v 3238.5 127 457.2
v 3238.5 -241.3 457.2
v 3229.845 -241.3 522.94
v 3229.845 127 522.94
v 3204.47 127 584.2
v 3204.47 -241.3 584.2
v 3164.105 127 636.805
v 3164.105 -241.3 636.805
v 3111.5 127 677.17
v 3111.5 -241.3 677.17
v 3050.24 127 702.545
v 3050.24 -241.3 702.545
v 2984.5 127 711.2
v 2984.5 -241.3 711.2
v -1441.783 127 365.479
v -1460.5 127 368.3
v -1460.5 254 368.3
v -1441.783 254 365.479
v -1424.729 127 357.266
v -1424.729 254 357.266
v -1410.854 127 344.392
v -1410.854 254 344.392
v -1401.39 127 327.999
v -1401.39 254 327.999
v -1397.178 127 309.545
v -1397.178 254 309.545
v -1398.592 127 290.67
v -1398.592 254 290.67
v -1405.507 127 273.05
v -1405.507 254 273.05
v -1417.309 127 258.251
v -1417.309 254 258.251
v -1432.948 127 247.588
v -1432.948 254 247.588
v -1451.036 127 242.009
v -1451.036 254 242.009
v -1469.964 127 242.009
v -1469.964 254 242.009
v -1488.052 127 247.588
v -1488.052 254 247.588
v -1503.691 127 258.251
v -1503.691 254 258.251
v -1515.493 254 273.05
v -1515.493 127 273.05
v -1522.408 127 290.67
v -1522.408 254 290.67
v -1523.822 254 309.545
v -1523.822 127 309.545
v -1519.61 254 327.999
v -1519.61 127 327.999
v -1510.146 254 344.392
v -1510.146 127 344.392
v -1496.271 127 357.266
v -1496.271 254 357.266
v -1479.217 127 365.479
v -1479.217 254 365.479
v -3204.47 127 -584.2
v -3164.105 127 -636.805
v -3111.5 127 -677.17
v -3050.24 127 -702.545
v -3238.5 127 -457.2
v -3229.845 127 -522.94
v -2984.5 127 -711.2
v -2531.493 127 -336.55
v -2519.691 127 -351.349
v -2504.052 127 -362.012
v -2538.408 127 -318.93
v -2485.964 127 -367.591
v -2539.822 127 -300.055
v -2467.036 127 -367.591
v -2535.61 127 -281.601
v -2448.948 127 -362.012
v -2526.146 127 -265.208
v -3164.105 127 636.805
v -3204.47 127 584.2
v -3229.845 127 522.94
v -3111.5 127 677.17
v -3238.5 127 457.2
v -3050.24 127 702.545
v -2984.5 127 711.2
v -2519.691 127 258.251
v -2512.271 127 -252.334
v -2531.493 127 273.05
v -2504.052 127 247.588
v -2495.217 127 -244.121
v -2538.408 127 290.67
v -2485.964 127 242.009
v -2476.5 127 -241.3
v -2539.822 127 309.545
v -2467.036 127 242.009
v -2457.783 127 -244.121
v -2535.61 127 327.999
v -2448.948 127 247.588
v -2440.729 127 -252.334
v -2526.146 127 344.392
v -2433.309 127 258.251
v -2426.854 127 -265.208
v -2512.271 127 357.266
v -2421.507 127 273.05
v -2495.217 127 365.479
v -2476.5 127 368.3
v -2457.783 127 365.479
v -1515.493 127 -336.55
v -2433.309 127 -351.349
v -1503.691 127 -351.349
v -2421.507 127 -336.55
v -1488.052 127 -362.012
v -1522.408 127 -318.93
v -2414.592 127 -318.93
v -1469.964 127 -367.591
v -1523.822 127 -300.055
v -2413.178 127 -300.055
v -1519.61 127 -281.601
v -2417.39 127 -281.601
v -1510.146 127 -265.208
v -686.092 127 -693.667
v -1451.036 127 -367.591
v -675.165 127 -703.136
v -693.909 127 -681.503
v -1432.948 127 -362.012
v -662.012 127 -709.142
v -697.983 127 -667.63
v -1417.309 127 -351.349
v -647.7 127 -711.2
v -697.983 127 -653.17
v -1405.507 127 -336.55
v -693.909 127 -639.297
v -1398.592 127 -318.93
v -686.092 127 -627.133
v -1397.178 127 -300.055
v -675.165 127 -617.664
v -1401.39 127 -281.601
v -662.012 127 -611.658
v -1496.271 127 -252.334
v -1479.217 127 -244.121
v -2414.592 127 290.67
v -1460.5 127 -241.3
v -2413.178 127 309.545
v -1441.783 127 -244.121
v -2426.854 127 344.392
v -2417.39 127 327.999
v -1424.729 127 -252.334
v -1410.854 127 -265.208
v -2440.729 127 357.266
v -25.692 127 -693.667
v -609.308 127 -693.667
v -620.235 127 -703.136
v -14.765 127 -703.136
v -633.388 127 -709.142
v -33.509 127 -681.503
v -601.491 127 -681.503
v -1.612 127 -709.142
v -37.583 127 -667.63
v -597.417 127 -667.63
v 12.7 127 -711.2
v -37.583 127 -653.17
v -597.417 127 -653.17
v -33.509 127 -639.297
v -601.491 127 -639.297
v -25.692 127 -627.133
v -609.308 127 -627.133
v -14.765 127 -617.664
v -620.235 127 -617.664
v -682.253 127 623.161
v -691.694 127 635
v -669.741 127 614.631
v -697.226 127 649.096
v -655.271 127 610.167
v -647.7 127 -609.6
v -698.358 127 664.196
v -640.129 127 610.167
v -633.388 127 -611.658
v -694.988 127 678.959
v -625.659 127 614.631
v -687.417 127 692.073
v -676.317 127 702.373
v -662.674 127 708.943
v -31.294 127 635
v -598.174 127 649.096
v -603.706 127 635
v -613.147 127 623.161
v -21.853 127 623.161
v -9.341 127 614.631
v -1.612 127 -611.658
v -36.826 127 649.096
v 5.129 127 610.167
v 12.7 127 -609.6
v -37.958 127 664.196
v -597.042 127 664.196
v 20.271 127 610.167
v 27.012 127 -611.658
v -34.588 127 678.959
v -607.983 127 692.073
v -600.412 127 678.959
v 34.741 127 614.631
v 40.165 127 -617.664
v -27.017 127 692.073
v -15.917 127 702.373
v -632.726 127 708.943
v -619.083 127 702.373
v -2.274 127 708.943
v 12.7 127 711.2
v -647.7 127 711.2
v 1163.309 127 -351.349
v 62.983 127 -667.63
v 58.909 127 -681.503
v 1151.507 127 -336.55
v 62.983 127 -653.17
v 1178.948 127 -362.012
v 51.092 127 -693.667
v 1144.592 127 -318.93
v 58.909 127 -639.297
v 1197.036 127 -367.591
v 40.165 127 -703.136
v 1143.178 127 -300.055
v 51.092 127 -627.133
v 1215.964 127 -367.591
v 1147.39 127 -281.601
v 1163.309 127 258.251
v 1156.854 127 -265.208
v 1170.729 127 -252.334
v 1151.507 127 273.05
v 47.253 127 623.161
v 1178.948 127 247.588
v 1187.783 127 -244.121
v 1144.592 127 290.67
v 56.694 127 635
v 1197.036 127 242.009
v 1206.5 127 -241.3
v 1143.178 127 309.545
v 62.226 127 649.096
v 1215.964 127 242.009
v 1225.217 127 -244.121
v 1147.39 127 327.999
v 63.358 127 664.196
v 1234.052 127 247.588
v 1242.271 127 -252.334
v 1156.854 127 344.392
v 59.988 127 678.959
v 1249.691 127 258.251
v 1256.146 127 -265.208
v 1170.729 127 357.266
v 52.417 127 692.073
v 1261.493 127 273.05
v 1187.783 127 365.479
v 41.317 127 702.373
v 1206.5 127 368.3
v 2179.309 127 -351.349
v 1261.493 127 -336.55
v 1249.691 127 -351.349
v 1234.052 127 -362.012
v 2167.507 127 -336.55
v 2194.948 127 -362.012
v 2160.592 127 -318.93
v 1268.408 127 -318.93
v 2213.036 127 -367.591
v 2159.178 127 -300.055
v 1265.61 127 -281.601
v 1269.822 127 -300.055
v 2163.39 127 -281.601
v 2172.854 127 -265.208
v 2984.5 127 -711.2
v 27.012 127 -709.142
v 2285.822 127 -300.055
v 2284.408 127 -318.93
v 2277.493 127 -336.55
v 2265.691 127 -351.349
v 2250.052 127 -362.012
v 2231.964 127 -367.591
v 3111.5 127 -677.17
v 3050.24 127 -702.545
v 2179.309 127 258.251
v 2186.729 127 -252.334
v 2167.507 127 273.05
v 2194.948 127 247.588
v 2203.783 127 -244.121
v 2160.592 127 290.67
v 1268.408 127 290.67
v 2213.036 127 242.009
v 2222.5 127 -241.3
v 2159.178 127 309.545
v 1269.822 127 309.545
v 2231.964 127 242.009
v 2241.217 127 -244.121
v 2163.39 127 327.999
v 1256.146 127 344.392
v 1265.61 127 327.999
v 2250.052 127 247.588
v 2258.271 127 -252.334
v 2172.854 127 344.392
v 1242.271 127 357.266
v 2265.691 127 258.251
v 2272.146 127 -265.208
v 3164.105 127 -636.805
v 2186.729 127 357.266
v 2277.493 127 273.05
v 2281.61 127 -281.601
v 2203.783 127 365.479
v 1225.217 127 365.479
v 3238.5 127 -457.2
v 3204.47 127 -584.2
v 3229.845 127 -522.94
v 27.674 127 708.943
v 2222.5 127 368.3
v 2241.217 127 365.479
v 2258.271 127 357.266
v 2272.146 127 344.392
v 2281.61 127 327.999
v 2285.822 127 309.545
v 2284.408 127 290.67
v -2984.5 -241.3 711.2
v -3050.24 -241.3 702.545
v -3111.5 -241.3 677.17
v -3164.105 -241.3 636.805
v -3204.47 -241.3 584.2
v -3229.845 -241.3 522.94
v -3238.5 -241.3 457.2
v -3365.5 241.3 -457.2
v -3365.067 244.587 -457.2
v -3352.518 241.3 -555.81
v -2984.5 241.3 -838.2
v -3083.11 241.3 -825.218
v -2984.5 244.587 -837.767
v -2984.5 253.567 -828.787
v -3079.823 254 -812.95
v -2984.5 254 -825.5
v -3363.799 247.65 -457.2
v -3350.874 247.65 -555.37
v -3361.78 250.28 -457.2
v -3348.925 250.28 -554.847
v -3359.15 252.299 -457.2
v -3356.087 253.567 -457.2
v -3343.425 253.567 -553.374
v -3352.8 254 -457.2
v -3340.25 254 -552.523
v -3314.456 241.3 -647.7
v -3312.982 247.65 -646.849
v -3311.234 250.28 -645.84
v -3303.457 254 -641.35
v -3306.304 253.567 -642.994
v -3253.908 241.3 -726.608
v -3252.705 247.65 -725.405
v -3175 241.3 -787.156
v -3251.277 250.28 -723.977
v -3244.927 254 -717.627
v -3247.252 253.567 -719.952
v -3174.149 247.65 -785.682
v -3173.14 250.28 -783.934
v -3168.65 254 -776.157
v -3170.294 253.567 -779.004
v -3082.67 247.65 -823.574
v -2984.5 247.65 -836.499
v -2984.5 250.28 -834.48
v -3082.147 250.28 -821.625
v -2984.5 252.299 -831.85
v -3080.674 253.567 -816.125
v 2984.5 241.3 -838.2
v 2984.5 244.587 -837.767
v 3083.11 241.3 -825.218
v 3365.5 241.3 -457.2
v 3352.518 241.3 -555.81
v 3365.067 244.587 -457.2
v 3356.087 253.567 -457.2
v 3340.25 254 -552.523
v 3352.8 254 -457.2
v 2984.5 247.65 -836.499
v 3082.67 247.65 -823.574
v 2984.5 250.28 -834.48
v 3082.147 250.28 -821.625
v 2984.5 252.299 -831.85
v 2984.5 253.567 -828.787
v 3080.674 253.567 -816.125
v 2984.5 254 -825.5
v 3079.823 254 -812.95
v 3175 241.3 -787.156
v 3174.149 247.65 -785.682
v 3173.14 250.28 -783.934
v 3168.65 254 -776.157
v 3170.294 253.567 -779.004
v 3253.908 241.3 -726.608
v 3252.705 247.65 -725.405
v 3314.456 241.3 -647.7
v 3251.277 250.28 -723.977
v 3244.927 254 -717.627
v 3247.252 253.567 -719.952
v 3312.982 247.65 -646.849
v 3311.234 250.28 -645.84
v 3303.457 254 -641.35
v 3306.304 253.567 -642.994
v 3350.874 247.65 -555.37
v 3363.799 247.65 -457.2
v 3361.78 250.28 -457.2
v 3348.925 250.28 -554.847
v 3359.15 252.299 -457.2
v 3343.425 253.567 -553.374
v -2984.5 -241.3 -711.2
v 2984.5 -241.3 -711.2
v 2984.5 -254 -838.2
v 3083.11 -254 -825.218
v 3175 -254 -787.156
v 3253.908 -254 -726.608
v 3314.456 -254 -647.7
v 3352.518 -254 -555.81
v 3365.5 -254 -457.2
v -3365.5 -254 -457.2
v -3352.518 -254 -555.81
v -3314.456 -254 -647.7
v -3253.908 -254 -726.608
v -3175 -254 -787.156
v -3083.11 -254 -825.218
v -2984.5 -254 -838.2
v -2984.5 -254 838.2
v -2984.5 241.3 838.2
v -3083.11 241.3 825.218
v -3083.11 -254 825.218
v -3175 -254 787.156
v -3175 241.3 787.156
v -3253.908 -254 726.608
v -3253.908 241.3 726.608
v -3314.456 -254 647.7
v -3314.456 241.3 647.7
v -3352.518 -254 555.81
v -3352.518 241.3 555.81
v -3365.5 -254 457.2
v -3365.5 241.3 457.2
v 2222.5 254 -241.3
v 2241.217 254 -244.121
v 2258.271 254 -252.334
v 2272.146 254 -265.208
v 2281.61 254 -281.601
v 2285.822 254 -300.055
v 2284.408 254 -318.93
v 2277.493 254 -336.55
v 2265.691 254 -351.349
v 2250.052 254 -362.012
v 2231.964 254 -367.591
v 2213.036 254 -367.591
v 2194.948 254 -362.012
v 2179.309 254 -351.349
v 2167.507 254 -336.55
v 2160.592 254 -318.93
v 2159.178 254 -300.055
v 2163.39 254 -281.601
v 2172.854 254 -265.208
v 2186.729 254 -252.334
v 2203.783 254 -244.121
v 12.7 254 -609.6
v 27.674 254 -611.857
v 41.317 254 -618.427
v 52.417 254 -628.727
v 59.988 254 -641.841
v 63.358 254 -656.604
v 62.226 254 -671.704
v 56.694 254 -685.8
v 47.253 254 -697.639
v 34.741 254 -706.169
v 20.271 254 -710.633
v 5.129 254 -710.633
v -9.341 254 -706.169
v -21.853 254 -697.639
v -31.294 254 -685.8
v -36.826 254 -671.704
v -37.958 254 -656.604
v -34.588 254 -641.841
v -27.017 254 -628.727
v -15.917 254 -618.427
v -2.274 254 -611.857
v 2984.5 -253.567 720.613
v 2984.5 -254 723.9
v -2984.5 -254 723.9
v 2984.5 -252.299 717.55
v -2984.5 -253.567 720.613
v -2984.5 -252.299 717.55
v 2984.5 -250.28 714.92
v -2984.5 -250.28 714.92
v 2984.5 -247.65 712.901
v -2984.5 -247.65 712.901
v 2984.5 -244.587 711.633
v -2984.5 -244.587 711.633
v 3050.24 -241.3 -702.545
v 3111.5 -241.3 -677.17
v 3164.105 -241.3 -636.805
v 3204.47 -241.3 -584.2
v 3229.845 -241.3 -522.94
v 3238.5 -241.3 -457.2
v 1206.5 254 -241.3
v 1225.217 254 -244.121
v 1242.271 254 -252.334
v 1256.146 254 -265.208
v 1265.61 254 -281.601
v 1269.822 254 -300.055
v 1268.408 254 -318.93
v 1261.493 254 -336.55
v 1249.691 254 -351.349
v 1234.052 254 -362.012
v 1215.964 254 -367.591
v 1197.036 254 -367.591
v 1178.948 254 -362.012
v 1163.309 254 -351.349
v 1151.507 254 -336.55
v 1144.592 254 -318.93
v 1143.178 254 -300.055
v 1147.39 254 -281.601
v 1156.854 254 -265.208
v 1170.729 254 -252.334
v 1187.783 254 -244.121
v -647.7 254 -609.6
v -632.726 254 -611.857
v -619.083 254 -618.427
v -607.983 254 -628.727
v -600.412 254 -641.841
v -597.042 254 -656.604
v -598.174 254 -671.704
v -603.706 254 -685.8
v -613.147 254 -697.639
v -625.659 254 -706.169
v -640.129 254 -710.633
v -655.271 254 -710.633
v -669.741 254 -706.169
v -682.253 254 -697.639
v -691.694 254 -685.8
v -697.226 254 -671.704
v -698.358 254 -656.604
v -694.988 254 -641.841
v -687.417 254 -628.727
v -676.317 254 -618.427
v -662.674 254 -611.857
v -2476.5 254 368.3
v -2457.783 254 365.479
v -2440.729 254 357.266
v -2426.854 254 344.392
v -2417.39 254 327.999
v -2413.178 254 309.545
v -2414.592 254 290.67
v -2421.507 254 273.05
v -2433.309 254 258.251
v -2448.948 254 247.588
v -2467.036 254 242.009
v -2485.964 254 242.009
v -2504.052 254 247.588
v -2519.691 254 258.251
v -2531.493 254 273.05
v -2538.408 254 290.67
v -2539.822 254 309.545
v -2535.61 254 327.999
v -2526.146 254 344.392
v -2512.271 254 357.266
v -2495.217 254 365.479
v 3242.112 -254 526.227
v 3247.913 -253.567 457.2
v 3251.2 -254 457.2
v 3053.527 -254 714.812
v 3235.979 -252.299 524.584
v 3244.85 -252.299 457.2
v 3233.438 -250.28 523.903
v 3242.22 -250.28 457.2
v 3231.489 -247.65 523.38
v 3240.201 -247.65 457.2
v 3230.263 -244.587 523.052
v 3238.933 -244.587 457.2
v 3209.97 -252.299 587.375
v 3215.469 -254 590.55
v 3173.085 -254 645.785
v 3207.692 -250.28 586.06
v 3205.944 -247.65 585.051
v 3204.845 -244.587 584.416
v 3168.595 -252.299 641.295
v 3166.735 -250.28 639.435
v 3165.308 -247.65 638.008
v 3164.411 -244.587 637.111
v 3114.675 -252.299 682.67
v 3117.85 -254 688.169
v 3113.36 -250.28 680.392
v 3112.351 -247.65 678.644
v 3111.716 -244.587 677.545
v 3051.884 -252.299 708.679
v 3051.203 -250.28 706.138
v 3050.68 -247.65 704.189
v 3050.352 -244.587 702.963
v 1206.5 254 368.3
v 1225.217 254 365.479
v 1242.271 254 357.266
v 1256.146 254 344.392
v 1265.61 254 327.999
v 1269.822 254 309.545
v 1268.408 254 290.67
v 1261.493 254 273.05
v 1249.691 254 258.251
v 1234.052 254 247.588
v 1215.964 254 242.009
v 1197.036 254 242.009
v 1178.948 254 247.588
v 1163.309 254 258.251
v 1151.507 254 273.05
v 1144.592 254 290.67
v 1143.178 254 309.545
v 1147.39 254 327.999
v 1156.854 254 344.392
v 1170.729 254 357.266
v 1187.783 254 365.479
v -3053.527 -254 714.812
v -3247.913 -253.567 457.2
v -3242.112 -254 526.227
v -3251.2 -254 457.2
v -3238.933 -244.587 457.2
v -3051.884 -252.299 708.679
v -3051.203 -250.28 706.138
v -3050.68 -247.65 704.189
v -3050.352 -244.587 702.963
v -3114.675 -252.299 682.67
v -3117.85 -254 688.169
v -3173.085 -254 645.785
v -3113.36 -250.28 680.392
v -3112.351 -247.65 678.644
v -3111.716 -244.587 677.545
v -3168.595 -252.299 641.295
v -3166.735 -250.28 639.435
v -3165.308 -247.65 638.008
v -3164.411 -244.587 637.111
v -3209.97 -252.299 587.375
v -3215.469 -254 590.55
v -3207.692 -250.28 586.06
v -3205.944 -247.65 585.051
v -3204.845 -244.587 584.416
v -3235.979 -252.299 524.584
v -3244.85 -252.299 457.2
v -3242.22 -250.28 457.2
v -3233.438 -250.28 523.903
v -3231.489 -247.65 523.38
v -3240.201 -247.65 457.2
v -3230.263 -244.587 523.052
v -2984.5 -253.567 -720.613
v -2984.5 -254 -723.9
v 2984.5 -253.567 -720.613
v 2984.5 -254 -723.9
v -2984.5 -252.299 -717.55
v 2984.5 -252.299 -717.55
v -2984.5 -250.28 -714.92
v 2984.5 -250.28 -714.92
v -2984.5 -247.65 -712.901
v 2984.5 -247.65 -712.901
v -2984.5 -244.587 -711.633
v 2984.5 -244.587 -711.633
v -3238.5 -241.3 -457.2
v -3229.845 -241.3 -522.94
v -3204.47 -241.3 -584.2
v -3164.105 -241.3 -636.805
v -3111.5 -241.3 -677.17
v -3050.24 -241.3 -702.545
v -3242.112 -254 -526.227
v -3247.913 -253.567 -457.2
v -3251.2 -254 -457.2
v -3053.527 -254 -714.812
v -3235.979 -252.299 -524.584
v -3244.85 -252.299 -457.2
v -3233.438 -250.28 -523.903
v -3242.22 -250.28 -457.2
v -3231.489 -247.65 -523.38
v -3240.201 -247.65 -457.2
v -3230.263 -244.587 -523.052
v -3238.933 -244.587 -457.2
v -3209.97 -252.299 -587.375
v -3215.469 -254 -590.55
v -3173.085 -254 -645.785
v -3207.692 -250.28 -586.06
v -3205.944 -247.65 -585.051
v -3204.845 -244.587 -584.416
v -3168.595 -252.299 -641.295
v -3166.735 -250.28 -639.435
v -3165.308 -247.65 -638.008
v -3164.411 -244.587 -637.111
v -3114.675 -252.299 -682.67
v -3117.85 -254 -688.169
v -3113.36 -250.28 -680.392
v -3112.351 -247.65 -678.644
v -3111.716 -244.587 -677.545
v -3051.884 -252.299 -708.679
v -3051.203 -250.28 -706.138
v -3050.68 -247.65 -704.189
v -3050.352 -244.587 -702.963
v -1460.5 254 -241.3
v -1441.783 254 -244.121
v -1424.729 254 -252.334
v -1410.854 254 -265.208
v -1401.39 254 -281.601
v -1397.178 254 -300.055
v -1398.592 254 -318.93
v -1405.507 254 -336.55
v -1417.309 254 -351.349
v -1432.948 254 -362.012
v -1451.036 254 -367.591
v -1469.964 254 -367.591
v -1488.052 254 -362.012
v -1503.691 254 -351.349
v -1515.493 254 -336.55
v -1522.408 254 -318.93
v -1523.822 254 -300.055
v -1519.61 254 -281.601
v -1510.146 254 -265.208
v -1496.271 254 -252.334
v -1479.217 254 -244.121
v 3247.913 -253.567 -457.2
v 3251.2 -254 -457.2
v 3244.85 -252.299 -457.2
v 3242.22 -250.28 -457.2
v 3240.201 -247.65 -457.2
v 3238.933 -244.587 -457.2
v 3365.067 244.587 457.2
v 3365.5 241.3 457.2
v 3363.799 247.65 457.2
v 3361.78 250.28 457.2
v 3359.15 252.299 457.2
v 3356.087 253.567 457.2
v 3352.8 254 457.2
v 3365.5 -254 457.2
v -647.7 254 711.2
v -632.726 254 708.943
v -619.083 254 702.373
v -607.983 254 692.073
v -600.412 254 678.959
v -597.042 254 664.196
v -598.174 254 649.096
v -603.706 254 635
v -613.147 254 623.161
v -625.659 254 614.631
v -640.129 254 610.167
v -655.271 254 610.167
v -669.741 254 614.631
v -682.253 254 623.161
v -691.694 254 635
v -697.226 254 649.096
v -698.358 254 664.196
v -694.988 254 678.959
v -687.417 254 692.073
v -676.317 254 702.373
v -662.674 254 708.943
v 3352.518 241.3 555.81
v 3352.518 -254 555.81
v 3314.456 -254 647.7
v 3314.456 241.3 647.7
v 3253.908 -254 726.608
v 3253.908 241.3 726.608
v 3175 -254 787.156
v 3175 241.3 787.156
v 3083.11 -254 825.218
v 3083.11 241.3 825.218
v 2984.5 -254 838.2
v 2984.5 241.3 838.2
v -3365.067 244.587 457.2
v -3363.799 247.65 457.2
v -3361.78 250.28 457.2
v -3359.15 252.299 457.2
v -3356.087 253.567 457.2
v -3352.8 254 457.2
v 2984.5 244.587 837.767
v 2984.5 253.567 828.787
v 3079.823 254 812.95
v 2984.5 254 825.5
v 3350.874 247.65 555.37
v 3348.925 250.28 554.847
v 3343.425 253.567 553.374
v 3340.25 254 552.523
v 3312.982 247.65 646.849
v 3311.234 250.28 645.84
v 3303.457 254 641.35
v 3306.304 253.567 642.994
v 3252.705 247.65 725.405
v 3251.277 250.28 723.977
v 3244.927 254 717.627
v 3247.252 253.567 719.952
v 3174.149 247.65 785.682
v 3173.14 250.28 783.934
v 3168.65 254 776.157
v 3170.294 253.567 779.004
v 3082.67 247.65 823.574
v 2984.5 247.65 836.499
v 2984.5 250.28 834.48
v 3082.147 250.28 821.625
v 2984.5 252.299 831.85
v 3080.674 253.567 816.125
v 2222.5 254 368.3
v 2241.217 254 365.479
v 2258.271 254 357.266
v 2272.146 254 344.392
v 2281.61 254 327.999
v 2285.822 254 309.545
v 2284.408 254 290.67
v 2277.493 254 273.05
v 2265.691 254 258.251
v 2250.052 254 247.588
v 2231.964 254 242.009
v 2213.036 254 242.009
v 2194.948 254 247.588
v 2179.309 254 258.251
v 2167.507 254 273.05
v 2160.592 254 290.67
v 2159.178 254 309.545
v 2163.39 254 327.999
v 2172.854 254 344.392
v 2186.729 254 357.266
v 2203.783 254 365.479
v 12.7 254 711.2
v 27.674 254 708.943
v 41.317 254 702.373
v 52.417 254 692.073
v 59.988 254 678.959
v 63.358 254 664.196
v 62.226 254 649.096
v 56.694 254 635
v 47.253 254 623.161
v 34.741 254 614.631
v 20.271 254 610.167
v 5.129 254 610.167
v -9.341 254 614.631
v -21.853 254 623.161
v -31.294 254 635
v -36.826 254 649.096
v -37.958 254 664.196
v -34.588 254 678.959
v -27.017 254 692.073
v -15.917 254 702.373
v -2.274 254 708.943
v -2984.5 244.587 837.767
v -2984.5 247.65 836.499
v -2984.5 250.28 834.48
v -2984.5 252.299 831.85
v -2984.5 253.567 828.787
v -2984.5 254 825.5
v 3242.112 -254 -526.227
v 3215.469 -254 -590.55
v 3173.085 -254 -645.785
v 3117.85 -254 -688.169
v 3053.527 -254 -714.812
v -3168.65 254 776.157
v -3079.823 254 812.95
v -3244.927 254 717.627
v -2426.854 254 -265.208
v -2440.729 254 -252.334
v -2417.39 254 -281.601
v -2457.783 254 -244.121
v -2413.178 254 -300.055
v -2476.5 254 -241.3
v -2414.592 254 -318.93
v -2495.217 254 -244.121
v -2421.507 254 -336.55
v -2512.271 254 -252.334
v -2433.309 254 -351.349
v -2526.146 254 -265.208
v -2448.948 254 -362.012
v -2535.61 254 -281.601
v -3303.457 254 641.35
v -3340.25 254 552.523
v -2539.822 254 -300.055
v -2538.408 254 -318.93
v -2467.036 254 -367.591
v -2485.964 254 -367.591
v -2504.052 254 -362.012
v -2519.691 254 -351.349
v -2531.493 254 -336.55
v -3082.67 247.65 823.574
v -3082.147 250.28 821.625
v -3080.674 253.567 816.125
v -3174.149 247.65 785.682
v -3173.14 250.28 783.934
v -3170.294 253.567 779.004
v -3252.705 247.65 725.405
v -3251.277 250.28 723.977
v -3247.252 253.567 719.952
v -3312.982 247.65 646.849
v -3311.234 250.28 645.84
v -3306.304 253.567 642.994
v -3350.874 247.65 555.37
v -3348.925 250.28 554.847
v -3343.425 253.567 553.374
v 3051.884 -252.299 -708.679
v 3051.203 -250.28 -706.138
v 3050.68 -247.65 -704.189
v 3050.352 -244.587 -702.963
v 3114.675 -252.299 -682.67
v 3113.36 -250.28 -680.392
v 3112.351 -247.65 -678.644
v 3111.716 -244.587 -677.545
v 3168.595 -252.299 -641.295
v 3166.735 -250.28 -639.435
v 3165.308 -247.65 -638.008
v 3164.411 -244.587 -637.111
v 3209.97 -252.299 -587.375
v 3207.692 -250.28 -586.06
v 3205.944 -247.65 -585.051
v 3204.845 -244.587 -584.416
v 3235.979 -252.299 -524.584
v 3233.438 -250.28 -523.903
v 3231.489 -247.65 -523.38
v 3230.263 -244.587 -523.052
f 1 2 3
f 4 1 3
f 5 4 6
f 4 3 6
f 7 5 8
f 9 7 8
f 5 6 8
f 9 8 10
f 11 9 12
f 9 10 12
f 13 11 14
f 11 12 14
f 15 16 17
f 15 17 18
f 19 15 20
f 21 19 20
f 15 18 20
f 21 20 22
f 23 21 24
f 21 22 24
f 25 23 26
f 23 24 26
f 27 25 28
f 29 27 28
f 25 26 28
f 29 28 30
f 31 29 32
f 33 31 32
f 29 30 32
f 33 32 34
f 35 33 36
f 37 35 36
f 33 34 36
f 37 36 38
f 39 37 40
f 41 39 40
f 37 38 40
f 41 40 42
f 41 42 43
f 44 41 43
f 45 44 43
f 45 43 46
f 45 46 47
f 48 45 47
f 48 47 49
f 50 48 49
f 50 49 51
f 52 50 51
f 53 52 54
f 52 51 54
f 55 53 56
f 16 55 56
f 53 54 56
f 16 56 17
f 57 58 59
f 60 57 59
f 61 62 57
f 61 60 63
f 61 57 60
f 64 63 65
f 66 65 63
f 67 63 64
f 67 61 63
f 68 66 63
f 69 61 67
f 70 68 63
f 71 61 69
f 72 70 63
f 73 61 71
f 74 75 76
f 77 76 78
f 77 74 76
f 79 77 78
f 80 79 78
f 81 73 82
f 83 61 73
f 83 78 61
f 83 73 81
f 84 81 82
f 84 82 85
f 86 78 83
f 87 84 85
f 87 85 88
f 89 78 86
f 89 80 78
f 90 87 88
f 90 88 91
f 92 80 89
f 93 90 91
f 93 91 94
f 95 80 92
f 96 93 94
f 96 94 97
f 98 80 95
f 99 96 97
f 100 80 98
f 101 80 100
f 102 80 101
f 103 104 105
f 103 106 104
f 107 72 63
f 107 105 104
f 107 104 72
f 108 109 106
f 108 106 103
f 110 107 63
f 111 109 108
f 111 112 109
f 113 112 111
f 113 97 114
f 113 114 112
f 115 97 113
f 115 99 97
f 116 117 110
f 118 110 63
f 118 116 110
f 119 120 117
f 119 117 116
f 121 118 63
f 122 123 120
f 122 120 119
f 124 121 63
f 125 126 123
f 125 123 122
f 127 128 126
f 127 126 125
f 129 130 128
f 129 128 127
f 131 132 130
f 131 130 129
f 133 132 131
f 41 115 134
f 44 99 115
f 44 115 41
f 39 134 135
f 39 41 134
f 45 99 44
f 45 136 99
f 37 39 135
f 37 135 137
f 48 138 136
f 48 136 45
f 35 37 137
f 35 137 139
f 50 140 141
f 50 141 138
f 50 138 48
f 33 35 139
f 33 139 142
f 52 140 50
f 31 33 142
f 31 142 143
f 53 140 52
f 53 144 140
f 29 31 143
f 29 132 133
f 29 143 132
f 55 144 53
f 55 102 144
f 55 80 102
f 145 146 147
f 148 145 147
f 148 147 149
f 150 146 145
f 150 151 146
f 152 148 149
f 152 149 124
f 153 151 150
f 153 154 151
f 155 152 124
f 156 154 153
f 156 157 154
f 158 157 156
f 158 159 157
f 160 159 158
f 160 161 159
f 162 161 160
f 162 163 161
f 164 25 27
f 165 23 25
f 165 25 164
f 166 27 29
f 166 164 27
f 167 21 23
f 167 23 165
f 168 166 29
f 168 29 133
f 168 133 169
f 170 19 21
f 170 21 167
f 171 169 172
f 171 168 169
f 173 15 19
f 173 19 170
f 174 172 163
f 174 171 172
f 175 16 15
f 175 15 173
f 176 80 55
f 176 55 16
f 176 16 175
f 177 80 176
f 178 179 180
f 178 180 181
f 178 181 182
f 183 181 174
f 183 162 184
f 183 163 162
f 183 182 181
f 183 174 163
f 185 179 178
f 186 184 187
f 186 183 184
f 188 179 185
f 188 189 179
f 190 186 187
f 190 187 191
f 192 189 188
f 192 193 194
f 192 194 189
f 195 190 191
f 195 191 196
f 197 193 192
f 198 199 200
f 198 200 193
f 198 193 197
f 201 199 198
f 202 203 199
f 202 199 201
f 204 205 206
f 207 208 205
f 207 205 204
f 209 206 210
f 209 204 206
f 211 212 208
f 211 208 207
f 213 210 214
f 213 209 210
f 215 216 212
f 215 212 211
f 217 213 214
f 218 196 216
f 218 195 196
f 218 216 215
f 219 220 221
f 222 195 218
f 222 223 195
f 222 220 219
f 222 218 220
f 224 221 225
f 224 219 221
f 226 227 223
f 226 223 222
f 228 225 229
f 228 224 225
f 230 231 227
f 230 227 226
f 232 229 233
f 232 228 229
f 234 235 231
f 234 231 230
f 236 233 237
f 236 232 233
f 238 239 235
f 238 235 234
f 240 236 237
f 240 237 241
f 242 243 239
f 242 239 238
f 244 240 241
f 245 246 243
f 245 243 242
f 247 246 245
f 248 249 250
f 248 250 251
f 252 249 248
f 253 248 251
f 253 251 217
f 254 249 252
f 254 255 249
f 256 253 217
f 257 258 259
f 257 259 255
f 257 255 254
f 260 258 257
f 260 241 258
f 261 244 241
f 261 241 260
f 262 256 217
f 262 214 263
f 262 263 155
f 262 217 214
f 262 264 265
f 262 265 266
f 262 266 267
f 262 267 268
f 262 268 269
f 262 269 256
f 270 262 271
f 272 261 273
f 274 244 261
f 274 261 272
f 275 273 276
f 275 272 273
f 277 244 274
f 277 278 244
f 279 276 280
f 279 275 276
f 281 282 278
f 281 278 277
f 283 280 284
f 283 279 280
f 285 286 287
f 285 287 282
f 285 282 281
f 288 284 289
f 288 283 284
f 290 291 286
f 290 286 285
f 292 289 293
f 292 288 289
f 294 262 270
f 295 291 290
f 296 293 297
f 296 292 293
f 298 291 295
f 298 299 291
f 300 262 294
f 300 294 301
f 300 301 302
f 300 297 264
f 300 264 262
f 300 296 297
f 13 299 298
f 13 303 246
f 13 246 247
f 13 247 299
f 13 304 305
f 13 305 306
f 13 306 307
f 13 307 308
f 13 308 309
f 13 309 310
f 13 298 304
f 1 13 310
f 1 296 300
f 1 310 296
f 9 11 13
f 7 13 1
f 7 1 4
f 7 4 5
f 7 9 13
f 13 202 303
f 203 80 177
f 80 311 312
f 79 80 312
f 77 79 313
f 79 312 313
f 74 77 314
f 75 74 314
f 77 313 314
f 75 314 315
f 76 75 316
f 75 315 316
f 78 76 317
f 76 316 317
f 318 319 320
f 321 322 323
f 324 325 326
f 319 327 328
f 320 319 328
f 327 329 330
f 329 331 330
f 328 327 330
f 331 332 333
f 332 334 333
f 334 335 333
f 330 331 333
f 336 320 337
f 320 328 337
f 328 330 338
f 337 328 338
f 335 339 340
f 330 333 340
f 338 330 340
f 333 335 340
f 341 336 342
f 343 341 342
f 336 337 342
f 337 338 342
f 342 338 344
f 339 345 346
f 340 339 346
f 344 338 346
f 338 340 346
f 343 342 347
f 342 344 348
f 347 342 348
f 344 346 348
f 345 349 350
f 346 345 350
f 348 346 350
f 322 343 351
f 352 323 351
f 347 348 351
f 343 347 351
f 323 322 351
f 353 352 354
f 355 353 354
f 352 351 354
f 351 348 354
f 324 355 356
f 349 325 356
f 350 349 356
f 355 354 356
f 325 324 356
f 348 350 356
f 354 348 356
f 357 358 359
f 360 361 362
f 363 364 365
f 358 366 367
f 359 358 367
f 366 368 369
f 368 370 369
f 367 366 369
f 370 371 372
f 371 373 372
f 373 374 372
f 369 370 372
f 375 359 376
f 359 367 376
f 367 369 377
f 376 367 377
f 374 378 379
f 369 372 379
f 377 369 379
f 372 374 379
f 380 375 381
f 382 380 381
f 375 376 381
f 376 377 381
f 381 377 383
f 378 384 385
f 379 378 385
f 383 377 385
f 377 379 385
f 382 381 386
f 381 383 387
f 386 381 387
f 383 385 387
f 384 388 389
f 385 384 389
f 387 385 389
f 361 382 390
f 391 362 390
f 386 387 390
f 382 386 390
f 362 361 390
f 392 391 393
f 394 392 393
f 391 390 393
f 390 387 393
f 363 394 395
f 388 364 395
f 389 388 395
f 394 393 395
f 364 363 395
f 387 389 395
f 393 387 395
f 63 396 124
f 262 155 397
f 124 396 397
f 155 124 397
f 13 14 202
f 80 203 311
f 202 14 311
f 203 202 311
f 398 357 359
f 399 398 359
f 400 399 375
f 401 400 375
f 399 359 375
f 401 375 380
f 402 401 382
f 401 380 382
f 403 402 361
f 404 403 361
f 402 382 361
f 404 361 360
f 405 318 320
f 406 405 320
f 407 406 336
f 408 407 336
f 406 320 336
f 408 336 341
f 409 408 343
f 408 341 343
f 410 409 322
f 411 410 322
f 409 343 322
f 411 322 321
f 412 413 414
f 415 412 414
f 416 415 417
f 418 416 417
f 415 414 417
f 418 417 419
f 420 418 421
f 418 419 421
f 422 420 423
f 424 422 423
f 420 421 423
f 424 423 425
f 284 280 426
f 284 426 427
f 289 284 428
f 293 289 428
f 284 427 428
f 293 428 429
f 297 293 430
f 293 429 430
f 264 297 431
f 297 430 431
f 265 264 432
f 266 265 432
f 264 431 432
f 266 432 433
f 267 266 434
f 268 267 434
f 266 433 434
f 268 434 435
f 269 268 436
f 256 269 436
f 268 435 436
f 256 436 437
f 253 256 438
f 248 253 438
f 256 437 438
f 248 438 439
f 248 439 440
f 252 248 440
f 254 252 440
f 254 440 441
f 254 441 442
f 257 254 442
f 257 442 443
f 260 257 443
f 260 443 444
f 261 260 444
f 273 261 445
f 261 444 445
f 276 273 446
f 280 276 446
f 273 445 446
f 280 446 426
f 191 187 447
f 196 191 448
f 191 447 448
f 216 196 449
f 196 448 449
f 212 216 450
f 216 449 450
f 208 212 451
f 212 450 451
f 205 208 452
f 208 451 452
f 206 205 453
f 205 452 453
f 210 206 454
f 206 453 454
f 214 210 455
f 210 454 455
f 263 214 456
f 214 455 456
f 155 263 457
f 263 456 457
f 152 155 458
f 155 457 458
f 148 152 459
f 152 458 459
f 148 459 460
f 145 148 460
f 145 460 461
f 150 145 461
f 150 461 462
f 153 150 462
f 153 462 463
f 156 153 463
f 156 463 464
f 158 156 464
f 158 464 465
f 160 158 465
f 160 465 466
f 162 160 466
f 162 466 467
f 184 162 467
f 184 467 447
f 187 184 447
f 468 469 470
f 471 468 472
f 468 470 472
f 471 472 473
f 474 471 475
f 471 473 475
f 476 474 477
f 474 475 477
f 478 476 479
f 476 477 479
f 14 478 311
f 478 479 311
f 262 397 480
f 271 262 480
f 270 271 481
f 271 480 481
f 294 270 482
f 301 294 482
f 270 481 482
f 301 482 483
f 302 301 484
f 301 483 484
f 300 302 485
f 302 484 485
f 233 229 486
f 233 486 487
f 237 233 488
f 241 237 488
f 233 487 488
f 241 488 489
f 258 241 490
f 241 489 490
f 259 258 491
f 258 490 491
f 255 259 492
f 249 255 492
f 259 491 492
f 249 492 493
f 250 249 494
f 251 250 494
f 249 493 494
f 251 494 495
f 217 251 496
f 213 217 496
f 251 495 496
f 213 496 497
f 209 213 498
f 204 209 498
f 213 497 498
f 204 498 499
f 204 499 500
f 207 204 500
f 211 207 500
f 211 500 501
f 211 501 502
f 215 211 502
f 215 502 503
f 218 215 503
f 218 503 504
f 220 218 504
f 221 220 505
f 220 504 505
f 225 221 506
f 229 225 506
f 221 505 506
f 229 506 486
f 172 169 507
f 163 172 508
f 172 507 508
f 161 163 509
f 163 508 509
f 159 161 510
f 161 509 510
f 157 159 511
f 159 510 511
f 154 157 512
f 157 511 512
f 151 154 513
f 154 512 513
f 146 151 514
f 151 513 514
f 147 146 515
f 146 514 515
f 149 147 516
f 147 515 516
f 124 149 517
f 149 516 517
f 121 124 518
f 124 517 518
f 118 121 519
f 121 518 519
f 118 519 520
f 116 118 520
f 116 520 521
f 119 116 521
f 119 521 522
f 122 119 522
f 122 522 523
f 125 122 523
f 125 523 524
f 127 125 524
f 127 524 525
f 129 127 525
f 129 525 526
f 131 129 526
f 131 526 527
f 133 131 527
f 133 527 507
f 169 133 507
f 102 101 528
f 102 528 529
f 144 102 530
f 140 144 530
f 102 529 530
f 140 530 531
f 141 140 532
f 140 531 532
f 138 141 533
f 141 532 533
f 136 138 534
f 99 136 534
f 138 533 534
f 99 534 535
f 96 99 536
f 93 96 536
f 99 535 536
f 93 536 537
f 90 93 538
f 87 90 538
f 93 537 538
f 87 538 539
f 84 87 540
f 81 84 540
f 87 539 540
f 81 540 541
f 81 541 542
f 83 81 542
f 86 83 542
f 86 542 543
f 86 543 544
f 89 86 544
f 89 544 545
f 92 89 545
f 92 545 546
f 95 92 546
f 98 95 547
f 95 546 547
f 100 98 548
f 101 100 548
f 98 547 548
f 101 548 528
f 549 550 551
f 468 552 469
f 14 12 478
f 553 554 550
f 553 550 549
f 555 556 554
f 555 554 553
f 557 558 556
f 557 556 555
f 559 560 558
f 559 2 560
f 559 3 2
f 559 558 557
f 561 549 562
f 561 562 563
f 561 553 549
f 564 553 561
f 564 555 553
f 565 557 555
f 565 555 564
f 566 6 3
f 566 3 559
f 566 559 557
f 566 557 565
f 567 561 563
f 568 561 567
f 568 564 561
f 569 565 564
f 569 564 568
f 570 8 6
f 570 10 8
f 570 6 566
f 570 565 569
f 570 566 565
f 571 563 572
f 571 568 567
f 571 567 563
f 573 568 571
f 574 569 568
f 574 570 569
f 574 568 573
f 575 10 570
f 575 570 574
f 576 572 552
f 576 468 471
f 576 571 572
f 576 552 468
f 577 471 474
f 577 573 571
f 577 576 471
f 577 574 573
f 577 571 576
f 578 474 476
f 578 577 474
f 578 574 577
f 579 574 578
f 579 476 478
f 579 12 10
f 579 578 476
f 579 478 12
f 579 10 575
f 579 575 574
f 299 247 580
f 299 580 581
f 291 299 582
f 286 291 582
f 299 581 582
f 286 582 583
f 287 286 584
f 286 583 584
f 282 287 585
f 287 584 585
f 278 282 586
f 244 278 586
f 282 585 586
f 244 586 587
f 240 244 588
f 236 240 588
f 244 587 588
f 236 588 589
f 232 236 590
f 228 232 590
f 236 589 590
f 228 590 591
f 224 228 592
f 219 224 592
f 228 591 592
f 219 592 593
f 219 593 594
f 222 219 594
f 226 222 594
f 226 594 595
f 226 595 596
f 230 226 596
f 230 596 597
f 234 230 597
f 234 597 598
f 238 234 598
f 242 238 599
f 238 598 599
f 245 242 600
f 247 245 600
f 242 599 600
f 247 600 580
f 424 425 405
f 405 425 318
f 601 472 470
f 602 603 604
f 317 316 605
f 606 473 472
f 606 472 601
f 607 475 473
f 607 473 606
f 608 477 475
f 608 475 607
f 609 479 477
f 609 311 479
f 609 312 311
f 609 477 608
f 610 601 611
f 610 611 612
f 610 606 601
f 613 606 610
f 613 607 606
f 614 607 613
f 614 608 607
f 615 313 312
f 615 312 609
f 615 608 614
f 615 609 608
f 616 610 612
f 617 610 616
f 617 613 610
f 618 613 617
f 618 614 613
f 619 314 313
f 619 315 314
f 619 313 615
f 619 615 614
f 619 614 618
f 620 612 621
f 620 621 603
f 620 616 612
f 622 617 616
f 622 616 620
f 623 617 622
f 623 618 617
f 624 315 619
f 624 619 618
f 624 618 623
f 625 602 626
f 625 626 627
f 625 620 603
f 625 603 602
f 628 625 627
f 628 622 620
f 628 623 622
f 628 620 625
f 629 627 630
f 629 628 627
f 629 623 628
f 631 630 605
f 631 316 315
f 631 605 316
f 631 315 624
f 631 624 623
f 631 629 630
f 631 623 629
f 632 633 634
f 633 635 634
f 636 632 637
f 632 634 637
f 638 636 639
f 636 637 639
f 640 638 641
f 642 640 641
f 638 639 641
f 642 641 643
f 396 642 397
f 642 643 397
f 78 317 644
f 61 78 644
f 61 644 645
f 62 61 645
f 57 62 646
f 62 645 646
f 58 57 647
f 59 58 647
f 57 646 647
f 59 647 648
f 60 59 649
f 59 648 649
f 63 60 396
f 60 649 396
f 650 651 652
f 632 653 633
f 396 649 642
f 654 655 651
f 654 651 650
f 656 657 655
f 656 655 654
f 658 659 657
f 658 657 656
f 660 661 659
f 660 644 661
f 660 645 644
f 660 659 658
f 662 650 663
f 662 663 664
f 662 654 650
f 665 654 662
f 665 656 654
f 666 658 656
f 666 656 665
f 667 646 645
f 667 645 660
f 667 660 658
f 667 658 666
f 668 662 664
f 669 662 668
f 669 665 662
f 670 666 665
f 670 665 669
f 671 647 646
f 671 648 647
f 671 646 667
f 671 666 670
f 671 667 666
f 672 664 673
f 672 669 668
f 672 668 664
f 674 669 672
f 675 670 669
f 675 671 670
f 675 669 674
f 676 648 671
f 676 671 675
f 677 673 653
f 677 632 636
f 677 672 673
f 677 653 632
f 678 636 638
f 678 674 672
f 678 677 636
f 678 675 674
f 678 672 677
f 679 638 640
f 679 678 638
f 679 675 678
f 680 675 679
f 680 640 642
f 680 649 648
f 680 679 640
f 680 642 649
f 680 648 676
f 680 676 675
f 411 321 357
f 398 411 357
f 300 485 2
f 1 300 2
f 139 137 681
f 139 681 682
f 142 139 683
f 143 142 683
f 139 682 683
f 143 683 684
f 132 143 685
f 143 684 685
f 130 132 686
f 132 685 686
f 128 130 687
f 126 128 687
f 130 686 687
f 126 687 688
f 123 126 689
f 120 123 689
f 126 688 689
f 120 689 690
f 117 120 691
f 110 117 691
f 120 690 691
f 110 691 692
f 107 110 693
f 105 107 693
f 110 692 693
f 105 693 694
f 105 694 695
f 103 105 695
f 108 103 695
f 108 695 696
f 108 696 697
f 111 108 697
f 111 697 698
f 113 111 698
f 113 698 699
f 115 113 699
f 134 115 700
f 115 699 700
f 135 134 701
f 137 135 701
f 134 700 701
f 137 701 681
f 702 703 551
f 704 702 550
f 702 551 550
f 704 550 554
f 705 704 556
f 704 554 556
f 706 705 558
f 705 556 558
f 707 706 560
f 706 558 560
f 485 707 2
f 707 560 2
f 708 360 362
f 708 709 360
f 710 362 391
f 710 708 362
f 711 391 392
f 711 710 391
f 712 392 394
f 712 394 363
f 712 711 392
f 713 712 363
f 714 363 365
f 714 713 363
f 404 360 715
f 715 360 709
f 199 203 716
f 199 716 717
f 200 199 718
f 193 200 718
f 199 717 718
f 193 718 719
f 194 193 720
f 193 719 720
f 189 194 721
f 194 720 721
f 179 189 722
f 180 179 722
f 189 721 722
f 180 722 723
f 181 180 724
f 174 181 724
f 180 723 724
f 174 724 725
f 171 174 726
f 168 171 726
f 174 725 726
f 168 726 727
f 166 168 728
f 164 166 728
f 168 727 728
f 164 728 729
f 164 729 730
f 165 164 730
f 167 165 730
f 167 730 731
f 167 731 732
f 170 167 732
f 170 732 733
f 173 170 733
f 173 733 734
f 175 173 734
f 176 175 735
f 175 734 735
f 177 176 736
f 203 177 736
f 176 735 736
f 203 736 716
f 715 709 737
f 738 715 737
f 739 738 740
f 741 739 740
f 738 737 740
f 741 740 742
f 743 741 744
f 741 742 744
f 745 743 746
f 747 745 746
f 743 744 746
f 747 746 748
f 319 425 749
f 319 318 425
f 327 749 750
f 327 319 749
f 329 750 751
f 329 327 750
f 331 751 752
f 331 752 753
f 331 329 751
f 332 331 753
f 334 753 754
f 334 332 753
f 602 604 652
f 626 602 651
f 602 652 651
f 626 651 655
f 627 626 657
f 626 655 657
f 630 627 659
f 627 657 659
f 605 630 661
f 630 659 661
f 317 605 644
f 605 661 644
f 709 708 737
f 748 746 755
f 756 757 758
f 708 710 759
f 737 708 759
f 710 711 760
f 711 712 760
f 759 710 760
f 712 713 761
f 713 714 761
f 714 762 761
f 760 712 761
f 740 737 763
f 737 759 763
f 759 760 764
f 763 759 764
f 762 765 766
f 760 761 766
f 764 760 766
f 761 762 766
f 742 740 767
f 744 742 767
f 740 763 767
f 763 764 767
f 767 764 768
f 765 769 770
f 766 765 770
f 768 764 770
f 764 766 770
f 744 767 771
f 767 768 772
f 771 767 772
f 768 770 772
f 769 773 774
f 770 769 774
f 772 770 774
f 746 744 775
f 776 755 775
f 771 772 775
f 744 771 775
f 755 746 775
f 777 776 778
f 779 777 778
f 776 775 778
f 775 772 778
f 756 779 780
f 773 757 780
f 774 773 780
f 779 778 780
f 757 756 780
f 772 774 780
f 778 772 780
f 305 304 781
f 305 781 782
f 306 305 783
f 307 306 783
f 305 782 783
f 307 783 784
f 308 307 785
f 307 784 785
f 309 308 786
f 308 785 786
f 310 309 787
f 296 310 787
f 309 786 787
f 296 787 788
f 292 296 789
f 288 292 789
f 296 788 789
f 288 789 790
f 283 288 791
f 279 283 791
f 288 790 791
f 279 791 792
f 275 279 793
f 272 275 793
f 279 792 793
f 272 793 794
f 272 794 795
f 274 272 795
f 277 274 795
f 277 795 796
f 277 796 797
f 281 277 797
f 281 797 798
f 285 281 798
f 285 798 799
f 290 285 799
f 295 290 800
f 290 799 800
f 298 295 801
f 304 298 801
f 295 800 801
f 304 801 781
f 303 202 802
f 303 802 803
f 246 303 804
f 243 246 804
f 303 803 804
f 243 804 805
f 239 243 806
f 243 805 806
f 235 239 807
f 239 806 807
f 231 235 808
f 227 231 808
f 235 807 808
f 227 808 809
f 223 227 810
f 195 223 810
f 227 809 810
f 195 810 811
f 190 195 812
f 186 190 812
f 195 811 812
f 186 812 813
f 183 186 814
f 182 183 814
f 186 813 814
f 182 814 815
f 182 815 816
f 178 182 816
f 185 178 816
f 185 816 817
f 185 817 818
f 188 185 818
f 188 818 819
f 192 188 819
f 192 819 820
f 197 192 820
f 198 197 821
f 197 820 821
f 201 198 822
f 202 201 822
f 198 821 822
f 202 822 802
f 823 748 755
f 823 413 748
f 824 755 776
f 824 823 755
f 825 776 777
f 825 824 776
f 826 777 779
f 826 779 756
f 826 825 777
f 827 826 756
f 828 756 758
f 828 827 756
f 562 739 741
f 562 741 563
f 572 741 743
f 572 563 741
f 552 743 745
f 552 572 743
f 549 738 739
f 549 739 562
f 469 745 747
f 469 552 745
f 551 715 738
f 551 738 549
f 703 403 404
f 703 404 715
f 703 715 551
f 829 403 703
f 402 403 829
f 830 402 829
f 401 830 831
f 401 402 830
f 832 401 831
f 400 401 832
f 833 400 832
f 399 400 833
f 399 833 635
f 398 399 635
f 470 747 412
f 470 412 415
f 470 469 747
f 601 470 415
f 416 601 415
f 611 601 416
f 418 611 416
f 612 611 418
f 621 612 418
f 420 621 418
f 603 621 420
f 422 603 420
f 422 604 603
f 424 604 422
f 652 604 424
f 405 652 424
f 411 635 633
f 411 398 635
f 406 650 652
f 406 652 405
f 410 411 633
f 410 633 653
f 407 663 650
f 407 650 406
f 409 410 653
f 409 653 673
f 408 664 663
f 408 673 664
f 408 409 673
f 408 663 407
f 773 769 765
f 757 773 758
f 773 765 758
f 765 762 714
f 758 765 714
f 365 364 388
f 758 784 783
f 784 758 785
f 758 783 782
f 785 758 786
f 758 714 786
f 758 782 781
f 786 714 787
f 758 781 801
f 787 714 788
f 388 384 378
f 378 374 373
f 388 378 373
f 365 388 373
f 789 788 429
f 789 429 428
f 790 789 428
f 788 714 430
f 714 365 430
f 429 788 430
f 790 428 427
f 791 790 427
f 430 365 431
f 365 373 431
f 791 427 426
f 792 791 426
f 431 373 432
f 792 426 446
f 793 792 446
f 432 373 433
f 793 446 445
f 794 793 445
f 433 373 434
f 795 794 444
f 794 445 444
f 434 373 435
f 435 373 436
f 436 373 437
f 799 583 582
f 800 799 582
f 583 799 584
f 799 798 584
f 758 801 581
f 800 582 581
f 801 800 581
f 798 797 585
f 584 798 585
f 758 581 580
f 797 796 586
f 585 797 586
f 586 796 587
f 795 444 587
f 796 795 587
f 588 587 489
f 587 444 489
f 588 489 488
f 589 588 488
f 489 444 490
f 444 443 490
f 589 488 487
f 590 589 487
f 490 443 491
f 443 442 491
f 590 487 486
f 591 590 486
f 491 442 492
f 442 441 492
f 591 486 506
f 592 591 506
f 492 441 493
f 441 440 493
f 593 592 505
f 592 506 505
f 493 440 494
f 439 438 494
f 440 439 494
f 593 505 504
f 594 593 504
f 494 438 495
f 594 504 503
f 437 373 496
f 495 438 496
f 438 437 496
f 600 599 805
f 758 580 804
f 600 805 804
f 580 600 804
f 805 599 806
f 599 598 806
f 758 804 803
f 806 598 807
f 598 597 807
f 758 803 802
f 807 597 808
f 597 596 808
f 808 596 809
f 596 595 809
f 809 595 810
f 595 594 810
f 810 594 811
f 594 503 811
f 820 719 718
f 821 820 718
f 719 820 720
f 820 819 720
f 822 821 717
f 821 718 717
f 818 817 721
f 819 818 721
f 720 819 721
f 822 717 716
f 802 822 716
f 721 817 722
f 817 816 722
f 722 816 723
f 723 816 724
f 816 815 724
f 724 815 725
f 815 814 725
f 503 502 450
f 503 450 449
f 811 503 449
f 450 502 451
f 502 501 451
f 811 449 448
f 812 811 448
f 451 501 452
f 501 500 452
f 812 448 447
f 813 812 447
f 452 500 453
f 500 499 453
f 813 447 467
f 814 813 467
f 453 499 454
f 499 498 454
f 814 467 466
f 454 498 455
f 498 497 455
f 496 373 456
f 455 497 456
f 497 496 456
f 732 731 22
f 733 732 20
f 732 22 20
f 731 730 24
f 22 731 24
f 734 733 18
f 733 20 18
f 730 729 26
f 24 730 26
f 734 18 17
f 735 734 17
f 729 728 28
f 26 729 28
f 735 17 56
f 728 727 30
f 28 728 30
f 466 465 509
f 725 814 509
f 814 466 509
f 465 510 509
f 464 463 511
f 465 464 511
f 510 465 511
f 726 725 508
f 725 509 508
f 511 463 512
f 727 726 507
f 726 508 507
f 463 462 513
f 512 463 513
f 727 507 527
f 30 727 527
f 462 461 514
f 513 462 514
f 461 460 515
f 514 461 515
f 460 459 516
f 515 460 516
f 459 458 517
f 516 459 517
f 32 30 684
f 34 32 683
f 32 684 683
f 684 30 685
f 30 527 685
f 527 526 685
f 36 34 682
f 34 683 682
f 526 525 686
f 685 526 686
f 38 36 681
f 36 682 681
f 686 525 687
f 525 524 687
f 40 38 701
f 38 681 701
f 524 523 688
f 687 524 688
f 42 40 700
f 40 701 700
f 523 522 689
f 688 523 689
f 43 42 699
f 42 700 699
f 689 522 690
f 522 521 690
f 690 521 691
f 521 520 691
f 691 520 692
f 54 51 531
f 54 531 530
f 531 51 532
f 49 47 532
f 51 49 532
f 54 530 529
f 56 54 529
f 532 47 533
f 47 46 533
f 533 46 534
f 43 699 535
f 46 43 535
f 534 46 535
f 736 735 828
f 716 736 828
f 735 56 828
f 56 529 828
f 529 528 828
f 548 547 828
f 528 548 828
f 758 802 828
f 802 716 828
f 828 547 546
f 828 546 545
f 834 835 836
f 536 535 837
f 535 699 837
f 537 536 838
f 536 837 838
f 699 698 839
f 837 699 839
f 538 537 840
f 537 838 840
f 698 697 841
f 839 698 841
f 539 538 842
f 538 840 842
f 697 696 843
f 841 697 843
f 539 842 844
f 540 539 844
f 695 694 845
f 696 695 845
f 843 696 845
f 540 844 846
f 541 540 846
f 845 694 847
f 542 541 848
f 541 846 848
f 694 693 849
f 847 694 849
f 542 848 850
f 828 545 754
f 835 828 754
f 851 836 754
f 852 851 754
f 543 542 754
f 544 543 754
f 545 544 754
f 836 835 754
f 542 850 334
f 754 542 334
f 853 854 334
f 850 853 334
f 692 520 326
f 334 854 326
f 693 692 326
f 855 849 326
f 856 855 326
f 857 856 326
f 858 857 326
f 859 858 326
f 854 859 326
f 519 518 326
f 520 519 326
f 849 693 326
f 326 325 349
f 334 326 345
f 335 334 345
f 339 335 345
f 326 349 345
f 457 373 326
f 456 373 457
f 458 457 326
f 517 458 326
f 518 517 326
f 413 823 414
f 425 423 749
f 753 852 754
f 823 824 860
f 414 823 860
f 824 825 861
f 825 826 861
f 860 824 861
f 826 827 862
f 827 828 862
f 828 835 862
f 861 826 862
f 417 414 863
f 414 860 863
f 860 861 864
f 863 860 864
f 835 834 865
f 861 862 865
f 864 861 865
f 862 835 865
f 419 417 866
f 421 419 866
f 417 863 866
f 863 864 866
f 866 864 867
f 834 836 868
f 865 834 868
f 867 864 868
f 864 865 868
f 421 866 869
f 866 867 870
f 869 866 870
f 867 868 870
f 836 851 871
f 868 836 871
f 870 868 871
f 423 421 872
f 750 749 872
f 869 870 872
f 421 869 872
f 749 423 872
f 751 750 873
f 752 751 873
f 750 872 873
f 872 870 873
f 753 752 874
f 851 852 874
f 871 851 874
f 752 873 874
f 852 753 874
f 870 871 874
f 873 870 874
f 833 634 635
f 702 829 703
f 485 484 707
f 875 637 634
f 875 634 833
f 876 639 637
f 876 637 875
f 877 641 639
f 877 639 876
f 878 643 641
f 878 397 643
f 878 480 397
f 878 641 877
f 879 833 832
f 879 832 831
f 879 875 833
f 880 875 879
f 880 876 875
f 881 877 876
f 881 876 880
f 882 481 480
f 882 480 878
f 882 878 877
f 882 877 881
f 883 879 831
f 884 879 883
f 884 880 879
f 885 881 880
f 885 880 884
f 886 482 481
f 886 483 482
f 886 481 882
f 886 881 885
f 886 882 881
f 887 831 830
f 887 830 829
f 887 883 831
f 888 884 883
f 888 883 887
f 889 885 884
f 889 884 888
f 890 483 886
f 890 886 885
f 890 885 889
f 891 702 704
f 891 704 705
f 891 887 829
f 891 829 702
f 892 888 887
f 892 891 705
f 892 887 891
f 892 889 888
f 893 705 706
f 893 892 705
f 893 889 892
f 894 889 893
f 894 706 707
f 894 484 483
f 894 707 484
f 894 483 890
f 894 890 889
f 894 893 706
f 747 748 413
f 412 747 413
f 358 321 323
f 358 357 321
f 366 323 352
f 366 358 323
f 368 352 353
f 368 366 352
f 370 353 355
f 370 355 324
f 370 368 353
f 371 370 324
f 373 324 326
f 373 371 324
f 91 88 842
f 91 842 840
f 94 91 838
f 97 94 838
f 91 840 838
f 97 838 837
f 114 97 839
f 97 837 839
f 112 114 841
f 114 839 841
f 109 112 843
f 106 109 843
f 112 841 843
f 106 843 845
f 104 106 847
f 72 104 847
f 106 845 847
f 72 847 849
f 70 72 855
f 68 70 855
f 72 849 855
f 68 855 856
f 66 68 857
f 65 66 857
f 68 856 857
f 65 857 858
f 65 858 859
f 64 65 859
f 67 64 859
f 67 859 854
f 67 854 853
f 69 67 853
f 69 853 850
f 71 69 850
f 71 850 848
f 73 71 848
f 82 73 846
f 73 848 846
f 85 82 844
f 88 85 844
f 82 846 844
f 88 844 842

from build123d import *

# Parameters (mm, degrees)
BOSS_EXTRUDE1_DEPTH = 254
CUT_EXTRUDE1_DEPTH  = 381
SKETCH3_R           = 63.5
SKETCH3_R_2         = 50.8
CUT_EXTRUDE2_DEPTH  = 127
FILLET1_R           = 12.7


with BuildPart() as part:
    # Sketch1 → Boss-Extrude1 (new, symmetric)
    with BuildSketch(Plane(origin=(0, 0, 0), x_dir=(1, 0, 0), z_dir=(0, 1, 0))):
        with BuildLine():
            Line((-2984.5, 838.2), (2984.5, 838.2))
            ThreePointArc((2984.5, 838.2), (3253.907683632, 726.607683632), (3365.5, 457.2))
            Line((3365.5, 457.2), (3365.5, -457.2))
            ThreePointArc((3365.5, -457.2), (3253.907683632, -726.607683632), (2984.5, -838.2))
            Line((2984.5, -838.2), (-2984.5, -838.2))
            ThreePointArc((-2984.5, -838.2), (-3253.907683632, -726.607683632), (-3365.5, -457.2))
            Line((-3365.5, -457.2), (-3365.5, 457.2))
            ThreePointArc((-3365.5, 457.2), (-3253.907683632, 726.607683632), (-2984.5, 838.2))
        make_face()
    extrude(amount=BOSS_EXTRUDE1_DEPTH, both=True)

    # Sketch2 → Cut-Extrude1 (cut)
    with BuildSketch(Plane.XZ.offset(254)):
        with BuildLine():
            Line((3238.5, -457.2), (3238.5, 457.2))
            ThreePointArc((3238.5, 457.2), (3164.105122421, 636.805122421), (2984.5, 711.2))
            Line((2984.5, 711.2), (-2984.5, 711.2))
            ThreePointArc((-2984.5, 711.2), (-3164.105122421, 636.805122421), (-3238.5, 457.2))
            Line((-3238.5, 457.2), (-3238.5, -457.2))
            ThreePointArc((-3238.5, -457.2), (-3164.105122421, -636.805122421), (-2984.5, -711.2))
            Line((-2984.5, -711.2), (2984.5, -711.2))
            ThreePointArc((2984.5, -711.2), (3164.105122421, -636.805122421), (3238.5, -457.2))
        make_face()
    extrude(amount=-CUT_EXTRUDE1_DEPTH, mode=Mode.SUBTRACT)

    # Sketch3 → Cut-Extrude2 (cut)
    with BuildSketch(Plane(origin=(0, 254, 0), x_dir=(1, 0, 0), z_dir=(0, 1, 0))):
        with Locations(Location((-2476.5, 304.8, 0), (0, 0, 270))):
            Circle(SKETCH3_R)
        with Locations(Location((-1460.5, 304.8, 0), (0, 0, 270))):
            Circle(SKETCH3_R)
        with Locations(Location((-647.7, 660.4, 0), (0, 0, 270))):
            Circle(SKETCH3_R_2)
        with Locations(Location((12.7, 660.4, 0), (0, 0, 270))):
            Circle(SKETCH3_R_2)
        with Locations(Location((1206.5, 304.8, 0), (0, 0, 270))):
            Circle(SKETCH3_R)
        with Locations(Location((2222.5, 304.8, 0), (0, 0, 270))):
            Circle(SKETCH3_R)
        with Locations(Location((-2476.5, -304.8, 0), (0, 0, 270))):
            Circle(SKETCH3_R)
        with Locations(Location((-1460.5, -304.8, 0), (0, 0, 270))):
            Circle(SKETCH3_R)
        with Locations(Location((-647.7, -660.4, 0), (0, 0, 270))):
            Circle(SKETCH3_R_2)
        with Locations(Location((12.7, -660.4, 0), (0, 0, 270))):
            Circle(SKETCH3_R_2)
        with Locations(Location((1206.5, -304.8, 0), (0, 0, 270))):
            Circle(SKETCH3_R)
        with Locations(Location((2222.5, -304.8, 0), (0, 0, 270))):
            Circle(SKETCH3_R)
    extrude(amount=-CUT_EXTRUDE2_DEPTH, mode=Mode.SUBTRACT)

    # Fillet1
    fillet1_edges = [part.edges().sort_by_distance(p)[0] for p in [
        (3253.907683632, 254, -726.607683632),
        (0, 254, -838.2),
        (-3253.907683632, 254, -726.607683632),
        (-3365.5, 254, 0),
        (-3253.907683632, 254, 726.607683632),
        (3164.105122421, -254, -636.805122421),
        (3238.5, -254, 0),
        (3164.105122421, -254, 636.805122421),
        (0, -254, 711.2),
        (0, 254, 838.2),
        (-3164.105122421, -254, 636.805122421),
        (-3238.5, -254, 0),
        (-3164.105122421, -254, -636.805122421),
        (0, -254, -711.2),
        (3253.907683632, 254, 726.607683632),
        (3365.5, 254, 0),
    ]]
    fillet(fillet1_edges, radius=FILLET1_R)


solid = part.part
